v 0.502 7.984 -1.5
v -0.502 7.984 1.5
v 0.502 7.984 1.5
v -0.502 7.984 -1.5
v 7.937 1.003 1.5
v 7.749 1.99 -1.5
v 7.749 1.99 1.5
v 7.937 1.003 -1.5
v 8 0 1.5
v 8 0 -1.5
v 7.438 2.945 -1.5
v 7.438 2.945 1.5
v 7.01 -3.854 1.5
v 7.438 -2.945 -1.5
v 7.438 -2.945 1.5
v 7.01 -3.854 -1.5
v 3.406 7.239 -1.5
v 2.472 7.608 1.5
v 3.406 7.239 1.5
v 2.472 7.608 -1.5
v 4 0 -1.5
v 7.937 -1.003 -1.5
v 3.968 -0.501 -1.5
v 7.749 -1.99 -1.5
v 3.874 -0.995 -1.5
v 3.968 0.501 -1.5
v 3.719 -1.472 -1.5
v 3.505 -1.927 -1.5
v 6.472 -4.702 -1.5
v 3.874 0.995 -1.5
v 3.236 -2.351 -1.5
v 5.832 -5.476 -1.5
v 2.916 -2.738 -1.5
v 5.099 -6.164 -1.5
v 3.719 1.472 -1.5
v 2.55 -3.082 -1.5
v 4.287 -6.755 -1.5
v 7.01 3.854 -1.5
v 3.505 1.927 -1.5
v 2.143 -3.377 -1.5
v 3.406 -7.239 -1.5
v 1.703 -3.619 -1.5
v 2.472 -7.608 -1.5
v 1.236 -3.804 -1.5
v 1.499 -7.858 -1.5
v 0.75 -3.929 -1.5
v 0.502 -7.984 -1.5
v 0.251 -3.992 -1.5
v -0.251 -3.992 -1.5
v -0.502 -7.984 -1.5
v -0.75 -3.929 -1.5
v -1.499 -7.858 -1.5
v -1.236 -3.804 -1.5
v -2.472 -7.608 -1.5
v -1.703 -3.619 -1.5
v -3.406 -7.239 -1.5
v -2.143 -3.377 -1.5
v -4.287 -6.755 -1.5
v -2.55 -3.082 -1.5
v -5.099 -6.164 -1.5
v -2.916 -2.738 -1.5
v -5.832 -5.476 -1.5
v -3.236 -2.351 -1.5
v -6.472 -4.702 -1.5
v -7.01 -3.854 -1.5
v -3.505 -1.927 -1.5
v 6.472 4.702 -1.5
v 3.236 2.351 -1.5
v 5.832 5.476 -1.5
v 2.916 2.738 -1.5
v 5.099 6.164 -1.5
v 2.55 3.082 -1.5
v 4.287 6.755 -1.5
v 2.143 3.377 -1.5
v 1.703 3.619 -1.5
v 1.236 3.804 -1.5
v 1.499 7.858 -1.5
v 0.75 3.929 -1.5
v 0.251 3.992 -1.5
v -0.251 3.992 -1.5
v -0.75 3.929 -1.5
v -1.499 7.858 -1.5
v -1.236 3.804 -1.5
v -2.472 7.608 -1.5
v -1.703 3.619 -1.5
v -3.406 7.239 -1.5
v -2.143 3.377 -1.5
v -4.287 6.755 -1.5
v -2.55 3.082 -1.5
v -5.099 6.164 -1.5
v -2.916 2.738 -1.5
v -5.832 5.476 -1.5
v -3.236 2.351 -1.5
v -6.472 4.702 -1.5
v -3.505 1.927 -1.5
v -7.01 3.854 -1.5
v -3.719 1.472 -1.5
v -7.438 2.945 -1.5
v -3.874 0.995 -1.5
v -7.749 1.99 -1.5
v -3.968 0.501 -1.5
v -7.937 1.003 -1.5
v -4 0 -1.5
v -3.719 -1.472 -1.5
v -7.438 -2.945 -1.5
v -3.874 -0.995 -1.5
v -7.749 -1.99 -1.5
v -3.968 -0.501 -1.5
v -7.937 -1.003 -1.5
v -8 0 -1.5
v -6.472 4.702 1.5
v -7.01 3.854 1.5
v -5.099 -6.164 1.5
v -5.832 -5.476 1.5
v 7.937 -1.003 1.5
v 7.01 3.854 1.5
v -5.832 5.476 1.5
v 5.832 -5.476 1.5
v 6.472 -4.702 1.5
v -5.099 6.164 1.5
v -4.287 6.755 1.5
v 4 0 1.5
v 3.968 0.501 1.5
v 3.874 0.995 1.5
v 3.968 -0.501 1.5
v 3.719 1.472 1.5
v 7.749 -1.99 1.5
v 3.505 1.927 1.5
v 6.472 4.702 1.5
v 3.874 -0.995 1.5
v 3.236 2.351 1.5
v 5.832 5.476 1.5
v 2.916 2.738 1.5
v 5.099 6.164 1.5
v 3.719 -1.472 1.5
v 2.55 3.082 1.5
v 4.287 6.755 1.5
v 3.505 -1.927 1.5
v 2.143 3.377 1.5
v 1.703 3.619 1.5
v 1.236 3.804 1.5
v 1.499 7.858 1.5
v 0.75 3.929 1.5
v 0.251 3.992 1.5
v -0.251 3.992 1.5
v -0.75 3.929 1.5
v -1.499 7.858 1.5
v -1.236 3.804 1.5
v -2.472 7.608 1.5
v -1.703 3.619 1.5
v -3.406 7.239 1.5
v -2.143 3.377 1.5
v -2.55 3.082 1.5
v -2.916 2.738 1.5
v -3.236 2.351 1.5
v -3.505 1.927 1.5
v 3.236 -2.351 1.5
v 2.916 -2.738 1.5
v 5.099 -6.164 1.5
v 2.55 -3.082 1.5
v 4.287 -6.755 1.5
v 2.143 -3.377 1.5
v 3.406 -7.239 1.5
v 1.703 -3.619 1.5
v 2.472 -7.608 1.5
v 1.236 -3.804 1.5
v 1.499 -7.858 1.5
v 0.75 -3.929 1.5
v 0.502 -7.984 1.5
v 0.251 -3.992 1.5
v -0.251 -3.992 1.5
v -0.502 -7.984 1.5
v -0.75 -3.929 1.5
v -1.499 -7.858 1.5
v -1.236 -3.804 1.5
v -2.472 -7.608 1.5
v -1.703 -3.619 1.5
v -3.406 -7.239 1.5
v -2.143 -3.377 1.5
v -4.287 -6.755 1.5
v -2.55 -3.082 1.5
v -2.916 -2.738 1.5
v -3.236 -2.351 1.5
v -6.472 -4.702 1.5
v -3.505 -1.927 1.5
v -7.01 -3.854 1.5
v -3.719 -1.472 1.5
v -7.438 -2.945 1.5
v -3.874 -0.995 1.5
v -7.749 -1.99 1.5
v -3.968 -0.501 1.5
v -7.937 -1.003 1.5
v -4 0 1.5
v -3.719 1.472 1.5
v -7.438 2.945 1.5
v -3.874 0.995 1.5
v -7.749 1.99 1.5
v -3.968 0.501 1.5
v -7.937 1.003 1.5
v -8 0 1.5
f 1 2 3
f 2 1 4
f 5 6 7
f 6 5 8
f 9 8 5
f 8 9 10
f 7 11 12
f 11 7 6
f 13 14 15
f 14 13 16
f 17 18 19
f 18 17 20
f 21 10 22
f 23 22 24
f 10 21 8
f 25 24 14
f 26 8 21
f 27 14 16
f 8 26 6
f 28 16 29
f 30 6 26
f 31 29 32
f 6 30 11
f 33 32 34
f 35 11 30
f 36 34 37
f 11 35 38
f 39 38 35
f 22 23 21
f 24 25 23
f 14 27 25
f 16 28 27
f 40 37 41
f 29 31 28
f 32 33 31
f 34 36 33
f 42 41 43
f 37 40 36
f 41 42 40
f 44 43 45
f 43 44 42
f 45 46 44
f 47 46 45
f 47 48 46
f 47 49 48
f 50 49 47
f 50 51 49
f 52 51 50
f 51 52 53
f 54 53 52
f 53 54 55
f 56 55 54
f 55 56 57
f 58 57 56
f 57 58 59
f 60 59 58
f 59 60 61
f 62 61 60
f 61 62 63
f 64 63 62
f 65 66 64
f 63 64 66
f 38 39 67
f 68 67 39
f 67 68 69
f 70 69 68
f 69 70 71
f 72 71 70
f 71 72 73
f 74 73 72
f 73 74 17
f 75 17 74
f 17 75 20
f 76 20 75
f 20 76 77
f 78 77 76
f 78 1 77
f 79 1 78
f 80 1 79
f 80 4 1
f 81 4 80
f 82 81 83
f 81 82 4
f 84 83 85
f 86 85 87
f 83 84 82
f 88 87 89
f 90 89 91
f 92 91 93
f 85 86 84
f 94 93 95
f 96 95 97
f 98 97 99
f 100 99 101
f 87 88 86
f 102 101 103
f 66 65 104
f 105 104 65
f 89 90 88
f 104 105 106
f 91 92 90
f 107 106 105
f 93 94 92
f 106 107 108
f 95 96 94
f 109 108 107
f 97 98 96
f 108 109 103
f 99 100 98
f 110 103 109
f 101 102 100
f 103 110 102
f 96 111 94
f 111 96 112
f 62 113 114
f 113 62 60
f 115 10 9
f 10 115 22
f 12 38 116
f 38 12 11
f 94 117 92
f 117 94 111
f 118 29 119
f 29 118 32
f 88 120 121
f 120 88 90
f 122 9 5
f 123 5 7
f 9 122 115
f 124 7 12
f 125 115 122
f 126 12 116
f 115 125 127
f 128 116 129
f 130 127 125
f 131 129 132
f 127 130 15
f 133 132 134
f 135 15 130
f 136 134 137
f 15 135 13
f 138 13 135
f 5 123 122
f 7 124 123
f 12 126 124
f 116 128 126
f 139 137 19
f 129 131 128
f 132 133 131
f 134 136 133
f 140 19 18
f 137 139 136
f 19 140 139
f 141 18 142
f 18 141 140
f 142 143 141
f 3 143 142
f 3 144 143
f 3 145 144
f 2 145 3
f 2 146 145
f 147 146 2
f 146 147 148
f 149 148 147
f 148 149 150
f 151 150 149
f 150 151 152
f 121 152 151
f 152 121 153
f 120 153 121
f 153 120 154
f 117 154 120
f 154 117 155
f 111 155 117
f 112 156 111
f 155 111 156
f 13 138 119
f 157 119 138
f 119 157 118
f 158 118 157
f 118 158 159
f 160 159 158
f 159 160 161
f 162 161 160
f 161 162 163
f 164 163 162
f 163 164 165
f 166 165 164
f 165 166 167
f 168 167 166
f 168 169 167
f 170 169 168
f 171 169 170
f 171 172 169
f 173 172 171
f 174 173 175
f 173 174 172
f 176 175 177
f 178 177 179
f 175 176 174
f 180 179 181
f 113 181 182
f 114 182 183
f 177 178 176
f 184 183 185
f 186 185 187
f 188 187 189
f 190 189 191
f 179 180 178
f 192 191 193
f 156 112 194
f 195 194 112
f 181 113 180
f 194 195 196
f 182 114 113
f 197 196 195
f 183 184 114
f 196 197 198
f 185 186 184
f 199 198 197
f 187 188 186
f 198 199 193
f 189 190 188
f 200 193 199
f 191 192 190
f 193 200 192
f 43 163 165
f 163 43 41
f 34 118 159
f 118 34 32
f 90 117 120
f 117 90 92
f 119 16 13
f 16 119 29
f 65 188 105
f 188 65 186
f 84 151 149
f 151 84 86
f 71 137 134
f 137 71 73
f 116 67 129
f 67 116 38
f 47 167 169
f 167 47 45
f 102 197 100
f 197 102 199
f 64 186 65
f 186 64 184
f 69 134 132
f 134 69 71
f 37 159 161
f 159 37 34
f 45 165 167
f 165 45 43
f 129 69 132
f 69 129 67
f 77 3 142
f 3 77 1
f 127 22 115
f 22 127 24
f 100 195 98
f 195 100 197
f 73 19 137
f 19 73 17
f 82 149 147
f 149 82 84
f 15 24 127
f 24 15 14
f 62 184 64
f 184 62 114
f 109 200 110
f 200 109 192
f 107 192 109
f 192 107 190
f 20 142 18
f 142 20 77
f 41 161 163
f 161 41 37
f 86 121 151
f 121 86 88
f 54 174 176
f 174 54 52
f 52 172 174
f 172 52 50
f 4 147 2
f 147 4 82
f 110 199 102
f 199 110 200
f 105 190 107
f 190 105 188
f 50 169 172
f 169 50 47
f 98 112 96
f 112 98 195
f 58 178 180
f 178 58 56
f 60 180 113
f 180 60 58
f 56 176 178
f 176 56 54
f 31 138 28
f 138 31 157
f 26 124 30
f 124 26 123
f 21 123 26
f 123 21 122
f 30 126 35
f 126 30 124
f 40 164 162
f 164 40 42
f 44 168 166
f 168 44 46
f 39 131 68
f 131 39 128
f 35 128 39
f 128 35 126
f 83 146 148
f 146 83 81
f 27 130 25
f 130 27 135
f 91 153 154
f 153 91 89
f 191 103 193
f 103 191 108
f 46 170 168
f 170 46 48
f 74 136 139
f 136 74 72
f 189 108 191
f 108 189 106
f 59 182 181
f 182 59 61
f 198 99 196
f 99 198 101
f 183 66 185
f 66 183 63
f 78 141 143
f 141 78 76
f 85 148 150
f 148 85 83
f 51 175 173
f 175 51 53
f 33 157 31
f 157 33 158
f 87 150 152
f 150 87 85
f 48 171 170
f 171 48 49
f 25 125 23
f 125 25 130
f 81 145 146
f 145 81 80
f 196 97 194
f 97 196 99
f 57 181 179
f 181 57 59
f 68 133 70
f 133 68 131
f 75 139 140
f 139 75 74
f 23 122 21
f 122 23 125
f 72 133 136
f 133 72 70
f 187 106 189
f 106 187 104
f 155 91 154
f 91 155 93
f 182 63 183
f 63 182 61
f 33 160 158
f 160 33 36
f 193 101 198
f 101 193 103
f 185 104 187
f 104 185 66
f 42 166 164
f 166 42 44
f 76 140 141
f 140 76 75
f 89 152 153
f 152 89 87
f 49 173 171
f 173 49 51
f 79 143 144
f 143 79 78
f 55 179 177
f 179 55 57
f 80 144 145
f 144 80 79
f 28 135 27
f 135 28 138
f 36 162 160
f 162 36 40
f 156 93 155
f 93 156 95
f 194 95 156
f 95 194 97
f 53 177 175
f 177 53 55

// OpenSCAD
$fn = 50;


difference() {
	union() {
		translate(v = [0, 0, -1.5000000000]) {
			cylinder(h = 3, r = 8.0000000000);
		}
	}
	union() {
		translate(v = [0, 0, -100.0000000000]) {
			cylinder(h = 200, r = 4.0000000000);
		}
	}
}
